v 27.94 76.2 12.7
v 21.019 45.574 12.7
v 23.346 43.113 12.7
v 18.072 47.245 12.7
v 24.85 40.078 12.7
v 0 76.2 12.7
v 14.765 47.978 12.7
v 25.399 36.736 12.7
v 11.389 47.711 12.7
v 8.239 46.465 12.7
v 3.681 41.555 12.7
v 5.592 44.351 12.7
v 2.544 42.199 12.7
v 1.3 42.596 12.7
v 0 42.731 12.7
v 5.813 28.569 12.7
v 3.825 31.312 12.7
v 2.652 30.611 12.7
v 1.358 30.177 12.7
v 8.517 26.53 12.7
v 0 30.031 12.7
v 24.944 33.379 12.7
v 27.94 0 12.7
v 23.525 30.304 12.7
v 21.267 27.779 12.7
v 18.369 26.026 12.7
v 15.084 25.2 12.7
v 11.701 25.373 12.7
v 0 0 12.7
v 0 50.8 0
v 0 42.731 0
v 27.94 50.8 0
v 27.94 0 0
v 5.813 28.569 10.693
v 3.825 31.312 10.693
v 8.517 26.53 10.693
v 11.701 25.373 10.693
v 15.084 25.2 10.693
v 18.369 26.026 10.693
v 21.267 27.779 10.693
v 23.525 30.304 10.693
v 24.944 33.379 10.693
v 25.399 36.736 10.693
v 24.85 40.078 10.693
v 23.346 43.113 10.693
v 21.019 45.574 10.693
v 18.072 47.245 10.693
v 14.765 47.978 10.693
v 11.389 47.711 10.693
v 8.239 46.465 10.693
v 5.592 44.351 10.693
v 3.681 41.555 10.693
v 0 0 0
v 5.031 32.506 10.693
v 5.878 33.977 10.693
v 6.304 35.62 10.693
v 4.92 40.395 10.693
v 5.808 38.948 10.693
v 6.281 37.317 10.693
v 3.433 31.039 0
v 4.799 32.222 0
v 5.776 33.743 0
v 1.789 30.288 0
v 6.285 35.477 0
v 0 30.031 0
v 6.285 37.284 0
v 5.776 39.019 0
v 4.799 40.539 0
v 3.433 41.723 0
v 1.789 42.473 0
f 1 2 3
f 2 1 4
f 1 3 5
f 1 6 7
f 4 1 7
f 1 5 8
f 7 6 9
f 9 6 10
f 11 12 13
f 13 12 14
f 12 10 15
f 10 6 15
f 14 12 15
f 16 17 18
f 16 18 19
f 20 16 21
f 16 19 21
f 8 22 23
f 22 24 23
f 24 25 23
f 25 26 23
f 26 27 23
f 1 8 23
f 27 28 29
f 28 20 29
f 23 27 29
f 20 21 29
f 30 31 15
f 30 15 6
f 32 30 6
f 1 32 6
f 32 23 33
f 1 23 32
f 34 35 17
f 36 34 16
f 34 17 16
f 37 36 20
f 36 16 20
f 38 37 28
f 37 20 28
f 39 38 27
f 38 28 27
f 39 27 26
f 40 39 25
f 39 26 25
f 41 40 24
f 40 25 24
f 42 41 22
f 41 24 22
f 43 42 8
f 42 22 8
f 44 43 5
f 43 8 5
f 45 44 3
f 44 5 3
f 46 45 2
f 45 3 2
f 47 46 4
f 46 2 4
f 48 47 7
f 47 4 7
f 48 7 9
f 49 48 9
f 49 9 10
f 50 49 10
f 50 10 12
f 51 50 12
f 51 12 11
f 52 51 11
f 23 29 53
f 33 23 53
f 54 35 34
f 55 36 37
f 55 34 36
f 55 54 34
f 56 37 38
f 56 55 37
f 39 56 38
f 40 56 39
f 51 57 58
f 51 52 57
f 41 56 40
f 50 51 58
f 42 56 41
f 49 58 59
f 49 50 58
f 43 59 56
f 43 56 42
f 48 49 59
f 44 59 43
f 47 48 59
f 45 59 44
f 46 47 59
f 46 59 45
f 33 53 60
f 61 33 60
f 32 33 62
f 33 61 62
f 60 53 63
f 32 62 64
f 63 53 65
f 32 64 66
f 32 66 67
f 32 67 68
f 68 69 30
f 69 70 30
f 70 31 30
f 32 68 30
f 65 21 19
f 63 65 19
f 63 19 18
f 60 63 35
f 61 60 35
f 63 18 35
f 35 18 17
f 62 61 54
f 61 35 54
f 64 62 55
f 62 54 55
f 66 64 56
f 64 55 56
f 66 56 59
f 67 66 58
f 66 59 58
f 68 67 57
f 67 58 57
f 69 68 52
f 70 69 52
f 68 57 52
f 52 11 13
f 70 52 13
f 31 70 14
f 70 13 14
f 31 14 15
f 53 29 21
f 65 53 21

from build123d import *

# Parameters (mm, degrees)
F1_DEPTH = 27.94
F2_R     = 11.43
F3_DEPTH = 2.0066
F4_R     = 6.35
F5_DEPTH = 25.4


with BuildPart() as f1:
    # F0 (on Right) → F1 (new body)
    with BuildSketch(Plane.YZ):
        Polygon((0, 12.7), (0, 0), (50.8, 0), (76.2, 12.7), align=None)
    extrude(amount=F1_DEPTH)

    # F2 (on face) → F3 (cut)
    with BuildSketch(Plane.XY.offset(12.7)):
        with Locations((13.97, 36.576)):
            Circle(F2_R)
    extrude(amount=-F3_DEPTH, mode=Mode.SUBTRACT)

    # F4 (on face) → F5 (cut)
    with BuildSketch(Plane.XY.offset(12.7)):
        with Locations((0, 36.380674)):
            Circle(F4_R)
    extrude(amount=-F5_DEPTH, mode=Mode.SUBTRACT)


solid = f1.part
